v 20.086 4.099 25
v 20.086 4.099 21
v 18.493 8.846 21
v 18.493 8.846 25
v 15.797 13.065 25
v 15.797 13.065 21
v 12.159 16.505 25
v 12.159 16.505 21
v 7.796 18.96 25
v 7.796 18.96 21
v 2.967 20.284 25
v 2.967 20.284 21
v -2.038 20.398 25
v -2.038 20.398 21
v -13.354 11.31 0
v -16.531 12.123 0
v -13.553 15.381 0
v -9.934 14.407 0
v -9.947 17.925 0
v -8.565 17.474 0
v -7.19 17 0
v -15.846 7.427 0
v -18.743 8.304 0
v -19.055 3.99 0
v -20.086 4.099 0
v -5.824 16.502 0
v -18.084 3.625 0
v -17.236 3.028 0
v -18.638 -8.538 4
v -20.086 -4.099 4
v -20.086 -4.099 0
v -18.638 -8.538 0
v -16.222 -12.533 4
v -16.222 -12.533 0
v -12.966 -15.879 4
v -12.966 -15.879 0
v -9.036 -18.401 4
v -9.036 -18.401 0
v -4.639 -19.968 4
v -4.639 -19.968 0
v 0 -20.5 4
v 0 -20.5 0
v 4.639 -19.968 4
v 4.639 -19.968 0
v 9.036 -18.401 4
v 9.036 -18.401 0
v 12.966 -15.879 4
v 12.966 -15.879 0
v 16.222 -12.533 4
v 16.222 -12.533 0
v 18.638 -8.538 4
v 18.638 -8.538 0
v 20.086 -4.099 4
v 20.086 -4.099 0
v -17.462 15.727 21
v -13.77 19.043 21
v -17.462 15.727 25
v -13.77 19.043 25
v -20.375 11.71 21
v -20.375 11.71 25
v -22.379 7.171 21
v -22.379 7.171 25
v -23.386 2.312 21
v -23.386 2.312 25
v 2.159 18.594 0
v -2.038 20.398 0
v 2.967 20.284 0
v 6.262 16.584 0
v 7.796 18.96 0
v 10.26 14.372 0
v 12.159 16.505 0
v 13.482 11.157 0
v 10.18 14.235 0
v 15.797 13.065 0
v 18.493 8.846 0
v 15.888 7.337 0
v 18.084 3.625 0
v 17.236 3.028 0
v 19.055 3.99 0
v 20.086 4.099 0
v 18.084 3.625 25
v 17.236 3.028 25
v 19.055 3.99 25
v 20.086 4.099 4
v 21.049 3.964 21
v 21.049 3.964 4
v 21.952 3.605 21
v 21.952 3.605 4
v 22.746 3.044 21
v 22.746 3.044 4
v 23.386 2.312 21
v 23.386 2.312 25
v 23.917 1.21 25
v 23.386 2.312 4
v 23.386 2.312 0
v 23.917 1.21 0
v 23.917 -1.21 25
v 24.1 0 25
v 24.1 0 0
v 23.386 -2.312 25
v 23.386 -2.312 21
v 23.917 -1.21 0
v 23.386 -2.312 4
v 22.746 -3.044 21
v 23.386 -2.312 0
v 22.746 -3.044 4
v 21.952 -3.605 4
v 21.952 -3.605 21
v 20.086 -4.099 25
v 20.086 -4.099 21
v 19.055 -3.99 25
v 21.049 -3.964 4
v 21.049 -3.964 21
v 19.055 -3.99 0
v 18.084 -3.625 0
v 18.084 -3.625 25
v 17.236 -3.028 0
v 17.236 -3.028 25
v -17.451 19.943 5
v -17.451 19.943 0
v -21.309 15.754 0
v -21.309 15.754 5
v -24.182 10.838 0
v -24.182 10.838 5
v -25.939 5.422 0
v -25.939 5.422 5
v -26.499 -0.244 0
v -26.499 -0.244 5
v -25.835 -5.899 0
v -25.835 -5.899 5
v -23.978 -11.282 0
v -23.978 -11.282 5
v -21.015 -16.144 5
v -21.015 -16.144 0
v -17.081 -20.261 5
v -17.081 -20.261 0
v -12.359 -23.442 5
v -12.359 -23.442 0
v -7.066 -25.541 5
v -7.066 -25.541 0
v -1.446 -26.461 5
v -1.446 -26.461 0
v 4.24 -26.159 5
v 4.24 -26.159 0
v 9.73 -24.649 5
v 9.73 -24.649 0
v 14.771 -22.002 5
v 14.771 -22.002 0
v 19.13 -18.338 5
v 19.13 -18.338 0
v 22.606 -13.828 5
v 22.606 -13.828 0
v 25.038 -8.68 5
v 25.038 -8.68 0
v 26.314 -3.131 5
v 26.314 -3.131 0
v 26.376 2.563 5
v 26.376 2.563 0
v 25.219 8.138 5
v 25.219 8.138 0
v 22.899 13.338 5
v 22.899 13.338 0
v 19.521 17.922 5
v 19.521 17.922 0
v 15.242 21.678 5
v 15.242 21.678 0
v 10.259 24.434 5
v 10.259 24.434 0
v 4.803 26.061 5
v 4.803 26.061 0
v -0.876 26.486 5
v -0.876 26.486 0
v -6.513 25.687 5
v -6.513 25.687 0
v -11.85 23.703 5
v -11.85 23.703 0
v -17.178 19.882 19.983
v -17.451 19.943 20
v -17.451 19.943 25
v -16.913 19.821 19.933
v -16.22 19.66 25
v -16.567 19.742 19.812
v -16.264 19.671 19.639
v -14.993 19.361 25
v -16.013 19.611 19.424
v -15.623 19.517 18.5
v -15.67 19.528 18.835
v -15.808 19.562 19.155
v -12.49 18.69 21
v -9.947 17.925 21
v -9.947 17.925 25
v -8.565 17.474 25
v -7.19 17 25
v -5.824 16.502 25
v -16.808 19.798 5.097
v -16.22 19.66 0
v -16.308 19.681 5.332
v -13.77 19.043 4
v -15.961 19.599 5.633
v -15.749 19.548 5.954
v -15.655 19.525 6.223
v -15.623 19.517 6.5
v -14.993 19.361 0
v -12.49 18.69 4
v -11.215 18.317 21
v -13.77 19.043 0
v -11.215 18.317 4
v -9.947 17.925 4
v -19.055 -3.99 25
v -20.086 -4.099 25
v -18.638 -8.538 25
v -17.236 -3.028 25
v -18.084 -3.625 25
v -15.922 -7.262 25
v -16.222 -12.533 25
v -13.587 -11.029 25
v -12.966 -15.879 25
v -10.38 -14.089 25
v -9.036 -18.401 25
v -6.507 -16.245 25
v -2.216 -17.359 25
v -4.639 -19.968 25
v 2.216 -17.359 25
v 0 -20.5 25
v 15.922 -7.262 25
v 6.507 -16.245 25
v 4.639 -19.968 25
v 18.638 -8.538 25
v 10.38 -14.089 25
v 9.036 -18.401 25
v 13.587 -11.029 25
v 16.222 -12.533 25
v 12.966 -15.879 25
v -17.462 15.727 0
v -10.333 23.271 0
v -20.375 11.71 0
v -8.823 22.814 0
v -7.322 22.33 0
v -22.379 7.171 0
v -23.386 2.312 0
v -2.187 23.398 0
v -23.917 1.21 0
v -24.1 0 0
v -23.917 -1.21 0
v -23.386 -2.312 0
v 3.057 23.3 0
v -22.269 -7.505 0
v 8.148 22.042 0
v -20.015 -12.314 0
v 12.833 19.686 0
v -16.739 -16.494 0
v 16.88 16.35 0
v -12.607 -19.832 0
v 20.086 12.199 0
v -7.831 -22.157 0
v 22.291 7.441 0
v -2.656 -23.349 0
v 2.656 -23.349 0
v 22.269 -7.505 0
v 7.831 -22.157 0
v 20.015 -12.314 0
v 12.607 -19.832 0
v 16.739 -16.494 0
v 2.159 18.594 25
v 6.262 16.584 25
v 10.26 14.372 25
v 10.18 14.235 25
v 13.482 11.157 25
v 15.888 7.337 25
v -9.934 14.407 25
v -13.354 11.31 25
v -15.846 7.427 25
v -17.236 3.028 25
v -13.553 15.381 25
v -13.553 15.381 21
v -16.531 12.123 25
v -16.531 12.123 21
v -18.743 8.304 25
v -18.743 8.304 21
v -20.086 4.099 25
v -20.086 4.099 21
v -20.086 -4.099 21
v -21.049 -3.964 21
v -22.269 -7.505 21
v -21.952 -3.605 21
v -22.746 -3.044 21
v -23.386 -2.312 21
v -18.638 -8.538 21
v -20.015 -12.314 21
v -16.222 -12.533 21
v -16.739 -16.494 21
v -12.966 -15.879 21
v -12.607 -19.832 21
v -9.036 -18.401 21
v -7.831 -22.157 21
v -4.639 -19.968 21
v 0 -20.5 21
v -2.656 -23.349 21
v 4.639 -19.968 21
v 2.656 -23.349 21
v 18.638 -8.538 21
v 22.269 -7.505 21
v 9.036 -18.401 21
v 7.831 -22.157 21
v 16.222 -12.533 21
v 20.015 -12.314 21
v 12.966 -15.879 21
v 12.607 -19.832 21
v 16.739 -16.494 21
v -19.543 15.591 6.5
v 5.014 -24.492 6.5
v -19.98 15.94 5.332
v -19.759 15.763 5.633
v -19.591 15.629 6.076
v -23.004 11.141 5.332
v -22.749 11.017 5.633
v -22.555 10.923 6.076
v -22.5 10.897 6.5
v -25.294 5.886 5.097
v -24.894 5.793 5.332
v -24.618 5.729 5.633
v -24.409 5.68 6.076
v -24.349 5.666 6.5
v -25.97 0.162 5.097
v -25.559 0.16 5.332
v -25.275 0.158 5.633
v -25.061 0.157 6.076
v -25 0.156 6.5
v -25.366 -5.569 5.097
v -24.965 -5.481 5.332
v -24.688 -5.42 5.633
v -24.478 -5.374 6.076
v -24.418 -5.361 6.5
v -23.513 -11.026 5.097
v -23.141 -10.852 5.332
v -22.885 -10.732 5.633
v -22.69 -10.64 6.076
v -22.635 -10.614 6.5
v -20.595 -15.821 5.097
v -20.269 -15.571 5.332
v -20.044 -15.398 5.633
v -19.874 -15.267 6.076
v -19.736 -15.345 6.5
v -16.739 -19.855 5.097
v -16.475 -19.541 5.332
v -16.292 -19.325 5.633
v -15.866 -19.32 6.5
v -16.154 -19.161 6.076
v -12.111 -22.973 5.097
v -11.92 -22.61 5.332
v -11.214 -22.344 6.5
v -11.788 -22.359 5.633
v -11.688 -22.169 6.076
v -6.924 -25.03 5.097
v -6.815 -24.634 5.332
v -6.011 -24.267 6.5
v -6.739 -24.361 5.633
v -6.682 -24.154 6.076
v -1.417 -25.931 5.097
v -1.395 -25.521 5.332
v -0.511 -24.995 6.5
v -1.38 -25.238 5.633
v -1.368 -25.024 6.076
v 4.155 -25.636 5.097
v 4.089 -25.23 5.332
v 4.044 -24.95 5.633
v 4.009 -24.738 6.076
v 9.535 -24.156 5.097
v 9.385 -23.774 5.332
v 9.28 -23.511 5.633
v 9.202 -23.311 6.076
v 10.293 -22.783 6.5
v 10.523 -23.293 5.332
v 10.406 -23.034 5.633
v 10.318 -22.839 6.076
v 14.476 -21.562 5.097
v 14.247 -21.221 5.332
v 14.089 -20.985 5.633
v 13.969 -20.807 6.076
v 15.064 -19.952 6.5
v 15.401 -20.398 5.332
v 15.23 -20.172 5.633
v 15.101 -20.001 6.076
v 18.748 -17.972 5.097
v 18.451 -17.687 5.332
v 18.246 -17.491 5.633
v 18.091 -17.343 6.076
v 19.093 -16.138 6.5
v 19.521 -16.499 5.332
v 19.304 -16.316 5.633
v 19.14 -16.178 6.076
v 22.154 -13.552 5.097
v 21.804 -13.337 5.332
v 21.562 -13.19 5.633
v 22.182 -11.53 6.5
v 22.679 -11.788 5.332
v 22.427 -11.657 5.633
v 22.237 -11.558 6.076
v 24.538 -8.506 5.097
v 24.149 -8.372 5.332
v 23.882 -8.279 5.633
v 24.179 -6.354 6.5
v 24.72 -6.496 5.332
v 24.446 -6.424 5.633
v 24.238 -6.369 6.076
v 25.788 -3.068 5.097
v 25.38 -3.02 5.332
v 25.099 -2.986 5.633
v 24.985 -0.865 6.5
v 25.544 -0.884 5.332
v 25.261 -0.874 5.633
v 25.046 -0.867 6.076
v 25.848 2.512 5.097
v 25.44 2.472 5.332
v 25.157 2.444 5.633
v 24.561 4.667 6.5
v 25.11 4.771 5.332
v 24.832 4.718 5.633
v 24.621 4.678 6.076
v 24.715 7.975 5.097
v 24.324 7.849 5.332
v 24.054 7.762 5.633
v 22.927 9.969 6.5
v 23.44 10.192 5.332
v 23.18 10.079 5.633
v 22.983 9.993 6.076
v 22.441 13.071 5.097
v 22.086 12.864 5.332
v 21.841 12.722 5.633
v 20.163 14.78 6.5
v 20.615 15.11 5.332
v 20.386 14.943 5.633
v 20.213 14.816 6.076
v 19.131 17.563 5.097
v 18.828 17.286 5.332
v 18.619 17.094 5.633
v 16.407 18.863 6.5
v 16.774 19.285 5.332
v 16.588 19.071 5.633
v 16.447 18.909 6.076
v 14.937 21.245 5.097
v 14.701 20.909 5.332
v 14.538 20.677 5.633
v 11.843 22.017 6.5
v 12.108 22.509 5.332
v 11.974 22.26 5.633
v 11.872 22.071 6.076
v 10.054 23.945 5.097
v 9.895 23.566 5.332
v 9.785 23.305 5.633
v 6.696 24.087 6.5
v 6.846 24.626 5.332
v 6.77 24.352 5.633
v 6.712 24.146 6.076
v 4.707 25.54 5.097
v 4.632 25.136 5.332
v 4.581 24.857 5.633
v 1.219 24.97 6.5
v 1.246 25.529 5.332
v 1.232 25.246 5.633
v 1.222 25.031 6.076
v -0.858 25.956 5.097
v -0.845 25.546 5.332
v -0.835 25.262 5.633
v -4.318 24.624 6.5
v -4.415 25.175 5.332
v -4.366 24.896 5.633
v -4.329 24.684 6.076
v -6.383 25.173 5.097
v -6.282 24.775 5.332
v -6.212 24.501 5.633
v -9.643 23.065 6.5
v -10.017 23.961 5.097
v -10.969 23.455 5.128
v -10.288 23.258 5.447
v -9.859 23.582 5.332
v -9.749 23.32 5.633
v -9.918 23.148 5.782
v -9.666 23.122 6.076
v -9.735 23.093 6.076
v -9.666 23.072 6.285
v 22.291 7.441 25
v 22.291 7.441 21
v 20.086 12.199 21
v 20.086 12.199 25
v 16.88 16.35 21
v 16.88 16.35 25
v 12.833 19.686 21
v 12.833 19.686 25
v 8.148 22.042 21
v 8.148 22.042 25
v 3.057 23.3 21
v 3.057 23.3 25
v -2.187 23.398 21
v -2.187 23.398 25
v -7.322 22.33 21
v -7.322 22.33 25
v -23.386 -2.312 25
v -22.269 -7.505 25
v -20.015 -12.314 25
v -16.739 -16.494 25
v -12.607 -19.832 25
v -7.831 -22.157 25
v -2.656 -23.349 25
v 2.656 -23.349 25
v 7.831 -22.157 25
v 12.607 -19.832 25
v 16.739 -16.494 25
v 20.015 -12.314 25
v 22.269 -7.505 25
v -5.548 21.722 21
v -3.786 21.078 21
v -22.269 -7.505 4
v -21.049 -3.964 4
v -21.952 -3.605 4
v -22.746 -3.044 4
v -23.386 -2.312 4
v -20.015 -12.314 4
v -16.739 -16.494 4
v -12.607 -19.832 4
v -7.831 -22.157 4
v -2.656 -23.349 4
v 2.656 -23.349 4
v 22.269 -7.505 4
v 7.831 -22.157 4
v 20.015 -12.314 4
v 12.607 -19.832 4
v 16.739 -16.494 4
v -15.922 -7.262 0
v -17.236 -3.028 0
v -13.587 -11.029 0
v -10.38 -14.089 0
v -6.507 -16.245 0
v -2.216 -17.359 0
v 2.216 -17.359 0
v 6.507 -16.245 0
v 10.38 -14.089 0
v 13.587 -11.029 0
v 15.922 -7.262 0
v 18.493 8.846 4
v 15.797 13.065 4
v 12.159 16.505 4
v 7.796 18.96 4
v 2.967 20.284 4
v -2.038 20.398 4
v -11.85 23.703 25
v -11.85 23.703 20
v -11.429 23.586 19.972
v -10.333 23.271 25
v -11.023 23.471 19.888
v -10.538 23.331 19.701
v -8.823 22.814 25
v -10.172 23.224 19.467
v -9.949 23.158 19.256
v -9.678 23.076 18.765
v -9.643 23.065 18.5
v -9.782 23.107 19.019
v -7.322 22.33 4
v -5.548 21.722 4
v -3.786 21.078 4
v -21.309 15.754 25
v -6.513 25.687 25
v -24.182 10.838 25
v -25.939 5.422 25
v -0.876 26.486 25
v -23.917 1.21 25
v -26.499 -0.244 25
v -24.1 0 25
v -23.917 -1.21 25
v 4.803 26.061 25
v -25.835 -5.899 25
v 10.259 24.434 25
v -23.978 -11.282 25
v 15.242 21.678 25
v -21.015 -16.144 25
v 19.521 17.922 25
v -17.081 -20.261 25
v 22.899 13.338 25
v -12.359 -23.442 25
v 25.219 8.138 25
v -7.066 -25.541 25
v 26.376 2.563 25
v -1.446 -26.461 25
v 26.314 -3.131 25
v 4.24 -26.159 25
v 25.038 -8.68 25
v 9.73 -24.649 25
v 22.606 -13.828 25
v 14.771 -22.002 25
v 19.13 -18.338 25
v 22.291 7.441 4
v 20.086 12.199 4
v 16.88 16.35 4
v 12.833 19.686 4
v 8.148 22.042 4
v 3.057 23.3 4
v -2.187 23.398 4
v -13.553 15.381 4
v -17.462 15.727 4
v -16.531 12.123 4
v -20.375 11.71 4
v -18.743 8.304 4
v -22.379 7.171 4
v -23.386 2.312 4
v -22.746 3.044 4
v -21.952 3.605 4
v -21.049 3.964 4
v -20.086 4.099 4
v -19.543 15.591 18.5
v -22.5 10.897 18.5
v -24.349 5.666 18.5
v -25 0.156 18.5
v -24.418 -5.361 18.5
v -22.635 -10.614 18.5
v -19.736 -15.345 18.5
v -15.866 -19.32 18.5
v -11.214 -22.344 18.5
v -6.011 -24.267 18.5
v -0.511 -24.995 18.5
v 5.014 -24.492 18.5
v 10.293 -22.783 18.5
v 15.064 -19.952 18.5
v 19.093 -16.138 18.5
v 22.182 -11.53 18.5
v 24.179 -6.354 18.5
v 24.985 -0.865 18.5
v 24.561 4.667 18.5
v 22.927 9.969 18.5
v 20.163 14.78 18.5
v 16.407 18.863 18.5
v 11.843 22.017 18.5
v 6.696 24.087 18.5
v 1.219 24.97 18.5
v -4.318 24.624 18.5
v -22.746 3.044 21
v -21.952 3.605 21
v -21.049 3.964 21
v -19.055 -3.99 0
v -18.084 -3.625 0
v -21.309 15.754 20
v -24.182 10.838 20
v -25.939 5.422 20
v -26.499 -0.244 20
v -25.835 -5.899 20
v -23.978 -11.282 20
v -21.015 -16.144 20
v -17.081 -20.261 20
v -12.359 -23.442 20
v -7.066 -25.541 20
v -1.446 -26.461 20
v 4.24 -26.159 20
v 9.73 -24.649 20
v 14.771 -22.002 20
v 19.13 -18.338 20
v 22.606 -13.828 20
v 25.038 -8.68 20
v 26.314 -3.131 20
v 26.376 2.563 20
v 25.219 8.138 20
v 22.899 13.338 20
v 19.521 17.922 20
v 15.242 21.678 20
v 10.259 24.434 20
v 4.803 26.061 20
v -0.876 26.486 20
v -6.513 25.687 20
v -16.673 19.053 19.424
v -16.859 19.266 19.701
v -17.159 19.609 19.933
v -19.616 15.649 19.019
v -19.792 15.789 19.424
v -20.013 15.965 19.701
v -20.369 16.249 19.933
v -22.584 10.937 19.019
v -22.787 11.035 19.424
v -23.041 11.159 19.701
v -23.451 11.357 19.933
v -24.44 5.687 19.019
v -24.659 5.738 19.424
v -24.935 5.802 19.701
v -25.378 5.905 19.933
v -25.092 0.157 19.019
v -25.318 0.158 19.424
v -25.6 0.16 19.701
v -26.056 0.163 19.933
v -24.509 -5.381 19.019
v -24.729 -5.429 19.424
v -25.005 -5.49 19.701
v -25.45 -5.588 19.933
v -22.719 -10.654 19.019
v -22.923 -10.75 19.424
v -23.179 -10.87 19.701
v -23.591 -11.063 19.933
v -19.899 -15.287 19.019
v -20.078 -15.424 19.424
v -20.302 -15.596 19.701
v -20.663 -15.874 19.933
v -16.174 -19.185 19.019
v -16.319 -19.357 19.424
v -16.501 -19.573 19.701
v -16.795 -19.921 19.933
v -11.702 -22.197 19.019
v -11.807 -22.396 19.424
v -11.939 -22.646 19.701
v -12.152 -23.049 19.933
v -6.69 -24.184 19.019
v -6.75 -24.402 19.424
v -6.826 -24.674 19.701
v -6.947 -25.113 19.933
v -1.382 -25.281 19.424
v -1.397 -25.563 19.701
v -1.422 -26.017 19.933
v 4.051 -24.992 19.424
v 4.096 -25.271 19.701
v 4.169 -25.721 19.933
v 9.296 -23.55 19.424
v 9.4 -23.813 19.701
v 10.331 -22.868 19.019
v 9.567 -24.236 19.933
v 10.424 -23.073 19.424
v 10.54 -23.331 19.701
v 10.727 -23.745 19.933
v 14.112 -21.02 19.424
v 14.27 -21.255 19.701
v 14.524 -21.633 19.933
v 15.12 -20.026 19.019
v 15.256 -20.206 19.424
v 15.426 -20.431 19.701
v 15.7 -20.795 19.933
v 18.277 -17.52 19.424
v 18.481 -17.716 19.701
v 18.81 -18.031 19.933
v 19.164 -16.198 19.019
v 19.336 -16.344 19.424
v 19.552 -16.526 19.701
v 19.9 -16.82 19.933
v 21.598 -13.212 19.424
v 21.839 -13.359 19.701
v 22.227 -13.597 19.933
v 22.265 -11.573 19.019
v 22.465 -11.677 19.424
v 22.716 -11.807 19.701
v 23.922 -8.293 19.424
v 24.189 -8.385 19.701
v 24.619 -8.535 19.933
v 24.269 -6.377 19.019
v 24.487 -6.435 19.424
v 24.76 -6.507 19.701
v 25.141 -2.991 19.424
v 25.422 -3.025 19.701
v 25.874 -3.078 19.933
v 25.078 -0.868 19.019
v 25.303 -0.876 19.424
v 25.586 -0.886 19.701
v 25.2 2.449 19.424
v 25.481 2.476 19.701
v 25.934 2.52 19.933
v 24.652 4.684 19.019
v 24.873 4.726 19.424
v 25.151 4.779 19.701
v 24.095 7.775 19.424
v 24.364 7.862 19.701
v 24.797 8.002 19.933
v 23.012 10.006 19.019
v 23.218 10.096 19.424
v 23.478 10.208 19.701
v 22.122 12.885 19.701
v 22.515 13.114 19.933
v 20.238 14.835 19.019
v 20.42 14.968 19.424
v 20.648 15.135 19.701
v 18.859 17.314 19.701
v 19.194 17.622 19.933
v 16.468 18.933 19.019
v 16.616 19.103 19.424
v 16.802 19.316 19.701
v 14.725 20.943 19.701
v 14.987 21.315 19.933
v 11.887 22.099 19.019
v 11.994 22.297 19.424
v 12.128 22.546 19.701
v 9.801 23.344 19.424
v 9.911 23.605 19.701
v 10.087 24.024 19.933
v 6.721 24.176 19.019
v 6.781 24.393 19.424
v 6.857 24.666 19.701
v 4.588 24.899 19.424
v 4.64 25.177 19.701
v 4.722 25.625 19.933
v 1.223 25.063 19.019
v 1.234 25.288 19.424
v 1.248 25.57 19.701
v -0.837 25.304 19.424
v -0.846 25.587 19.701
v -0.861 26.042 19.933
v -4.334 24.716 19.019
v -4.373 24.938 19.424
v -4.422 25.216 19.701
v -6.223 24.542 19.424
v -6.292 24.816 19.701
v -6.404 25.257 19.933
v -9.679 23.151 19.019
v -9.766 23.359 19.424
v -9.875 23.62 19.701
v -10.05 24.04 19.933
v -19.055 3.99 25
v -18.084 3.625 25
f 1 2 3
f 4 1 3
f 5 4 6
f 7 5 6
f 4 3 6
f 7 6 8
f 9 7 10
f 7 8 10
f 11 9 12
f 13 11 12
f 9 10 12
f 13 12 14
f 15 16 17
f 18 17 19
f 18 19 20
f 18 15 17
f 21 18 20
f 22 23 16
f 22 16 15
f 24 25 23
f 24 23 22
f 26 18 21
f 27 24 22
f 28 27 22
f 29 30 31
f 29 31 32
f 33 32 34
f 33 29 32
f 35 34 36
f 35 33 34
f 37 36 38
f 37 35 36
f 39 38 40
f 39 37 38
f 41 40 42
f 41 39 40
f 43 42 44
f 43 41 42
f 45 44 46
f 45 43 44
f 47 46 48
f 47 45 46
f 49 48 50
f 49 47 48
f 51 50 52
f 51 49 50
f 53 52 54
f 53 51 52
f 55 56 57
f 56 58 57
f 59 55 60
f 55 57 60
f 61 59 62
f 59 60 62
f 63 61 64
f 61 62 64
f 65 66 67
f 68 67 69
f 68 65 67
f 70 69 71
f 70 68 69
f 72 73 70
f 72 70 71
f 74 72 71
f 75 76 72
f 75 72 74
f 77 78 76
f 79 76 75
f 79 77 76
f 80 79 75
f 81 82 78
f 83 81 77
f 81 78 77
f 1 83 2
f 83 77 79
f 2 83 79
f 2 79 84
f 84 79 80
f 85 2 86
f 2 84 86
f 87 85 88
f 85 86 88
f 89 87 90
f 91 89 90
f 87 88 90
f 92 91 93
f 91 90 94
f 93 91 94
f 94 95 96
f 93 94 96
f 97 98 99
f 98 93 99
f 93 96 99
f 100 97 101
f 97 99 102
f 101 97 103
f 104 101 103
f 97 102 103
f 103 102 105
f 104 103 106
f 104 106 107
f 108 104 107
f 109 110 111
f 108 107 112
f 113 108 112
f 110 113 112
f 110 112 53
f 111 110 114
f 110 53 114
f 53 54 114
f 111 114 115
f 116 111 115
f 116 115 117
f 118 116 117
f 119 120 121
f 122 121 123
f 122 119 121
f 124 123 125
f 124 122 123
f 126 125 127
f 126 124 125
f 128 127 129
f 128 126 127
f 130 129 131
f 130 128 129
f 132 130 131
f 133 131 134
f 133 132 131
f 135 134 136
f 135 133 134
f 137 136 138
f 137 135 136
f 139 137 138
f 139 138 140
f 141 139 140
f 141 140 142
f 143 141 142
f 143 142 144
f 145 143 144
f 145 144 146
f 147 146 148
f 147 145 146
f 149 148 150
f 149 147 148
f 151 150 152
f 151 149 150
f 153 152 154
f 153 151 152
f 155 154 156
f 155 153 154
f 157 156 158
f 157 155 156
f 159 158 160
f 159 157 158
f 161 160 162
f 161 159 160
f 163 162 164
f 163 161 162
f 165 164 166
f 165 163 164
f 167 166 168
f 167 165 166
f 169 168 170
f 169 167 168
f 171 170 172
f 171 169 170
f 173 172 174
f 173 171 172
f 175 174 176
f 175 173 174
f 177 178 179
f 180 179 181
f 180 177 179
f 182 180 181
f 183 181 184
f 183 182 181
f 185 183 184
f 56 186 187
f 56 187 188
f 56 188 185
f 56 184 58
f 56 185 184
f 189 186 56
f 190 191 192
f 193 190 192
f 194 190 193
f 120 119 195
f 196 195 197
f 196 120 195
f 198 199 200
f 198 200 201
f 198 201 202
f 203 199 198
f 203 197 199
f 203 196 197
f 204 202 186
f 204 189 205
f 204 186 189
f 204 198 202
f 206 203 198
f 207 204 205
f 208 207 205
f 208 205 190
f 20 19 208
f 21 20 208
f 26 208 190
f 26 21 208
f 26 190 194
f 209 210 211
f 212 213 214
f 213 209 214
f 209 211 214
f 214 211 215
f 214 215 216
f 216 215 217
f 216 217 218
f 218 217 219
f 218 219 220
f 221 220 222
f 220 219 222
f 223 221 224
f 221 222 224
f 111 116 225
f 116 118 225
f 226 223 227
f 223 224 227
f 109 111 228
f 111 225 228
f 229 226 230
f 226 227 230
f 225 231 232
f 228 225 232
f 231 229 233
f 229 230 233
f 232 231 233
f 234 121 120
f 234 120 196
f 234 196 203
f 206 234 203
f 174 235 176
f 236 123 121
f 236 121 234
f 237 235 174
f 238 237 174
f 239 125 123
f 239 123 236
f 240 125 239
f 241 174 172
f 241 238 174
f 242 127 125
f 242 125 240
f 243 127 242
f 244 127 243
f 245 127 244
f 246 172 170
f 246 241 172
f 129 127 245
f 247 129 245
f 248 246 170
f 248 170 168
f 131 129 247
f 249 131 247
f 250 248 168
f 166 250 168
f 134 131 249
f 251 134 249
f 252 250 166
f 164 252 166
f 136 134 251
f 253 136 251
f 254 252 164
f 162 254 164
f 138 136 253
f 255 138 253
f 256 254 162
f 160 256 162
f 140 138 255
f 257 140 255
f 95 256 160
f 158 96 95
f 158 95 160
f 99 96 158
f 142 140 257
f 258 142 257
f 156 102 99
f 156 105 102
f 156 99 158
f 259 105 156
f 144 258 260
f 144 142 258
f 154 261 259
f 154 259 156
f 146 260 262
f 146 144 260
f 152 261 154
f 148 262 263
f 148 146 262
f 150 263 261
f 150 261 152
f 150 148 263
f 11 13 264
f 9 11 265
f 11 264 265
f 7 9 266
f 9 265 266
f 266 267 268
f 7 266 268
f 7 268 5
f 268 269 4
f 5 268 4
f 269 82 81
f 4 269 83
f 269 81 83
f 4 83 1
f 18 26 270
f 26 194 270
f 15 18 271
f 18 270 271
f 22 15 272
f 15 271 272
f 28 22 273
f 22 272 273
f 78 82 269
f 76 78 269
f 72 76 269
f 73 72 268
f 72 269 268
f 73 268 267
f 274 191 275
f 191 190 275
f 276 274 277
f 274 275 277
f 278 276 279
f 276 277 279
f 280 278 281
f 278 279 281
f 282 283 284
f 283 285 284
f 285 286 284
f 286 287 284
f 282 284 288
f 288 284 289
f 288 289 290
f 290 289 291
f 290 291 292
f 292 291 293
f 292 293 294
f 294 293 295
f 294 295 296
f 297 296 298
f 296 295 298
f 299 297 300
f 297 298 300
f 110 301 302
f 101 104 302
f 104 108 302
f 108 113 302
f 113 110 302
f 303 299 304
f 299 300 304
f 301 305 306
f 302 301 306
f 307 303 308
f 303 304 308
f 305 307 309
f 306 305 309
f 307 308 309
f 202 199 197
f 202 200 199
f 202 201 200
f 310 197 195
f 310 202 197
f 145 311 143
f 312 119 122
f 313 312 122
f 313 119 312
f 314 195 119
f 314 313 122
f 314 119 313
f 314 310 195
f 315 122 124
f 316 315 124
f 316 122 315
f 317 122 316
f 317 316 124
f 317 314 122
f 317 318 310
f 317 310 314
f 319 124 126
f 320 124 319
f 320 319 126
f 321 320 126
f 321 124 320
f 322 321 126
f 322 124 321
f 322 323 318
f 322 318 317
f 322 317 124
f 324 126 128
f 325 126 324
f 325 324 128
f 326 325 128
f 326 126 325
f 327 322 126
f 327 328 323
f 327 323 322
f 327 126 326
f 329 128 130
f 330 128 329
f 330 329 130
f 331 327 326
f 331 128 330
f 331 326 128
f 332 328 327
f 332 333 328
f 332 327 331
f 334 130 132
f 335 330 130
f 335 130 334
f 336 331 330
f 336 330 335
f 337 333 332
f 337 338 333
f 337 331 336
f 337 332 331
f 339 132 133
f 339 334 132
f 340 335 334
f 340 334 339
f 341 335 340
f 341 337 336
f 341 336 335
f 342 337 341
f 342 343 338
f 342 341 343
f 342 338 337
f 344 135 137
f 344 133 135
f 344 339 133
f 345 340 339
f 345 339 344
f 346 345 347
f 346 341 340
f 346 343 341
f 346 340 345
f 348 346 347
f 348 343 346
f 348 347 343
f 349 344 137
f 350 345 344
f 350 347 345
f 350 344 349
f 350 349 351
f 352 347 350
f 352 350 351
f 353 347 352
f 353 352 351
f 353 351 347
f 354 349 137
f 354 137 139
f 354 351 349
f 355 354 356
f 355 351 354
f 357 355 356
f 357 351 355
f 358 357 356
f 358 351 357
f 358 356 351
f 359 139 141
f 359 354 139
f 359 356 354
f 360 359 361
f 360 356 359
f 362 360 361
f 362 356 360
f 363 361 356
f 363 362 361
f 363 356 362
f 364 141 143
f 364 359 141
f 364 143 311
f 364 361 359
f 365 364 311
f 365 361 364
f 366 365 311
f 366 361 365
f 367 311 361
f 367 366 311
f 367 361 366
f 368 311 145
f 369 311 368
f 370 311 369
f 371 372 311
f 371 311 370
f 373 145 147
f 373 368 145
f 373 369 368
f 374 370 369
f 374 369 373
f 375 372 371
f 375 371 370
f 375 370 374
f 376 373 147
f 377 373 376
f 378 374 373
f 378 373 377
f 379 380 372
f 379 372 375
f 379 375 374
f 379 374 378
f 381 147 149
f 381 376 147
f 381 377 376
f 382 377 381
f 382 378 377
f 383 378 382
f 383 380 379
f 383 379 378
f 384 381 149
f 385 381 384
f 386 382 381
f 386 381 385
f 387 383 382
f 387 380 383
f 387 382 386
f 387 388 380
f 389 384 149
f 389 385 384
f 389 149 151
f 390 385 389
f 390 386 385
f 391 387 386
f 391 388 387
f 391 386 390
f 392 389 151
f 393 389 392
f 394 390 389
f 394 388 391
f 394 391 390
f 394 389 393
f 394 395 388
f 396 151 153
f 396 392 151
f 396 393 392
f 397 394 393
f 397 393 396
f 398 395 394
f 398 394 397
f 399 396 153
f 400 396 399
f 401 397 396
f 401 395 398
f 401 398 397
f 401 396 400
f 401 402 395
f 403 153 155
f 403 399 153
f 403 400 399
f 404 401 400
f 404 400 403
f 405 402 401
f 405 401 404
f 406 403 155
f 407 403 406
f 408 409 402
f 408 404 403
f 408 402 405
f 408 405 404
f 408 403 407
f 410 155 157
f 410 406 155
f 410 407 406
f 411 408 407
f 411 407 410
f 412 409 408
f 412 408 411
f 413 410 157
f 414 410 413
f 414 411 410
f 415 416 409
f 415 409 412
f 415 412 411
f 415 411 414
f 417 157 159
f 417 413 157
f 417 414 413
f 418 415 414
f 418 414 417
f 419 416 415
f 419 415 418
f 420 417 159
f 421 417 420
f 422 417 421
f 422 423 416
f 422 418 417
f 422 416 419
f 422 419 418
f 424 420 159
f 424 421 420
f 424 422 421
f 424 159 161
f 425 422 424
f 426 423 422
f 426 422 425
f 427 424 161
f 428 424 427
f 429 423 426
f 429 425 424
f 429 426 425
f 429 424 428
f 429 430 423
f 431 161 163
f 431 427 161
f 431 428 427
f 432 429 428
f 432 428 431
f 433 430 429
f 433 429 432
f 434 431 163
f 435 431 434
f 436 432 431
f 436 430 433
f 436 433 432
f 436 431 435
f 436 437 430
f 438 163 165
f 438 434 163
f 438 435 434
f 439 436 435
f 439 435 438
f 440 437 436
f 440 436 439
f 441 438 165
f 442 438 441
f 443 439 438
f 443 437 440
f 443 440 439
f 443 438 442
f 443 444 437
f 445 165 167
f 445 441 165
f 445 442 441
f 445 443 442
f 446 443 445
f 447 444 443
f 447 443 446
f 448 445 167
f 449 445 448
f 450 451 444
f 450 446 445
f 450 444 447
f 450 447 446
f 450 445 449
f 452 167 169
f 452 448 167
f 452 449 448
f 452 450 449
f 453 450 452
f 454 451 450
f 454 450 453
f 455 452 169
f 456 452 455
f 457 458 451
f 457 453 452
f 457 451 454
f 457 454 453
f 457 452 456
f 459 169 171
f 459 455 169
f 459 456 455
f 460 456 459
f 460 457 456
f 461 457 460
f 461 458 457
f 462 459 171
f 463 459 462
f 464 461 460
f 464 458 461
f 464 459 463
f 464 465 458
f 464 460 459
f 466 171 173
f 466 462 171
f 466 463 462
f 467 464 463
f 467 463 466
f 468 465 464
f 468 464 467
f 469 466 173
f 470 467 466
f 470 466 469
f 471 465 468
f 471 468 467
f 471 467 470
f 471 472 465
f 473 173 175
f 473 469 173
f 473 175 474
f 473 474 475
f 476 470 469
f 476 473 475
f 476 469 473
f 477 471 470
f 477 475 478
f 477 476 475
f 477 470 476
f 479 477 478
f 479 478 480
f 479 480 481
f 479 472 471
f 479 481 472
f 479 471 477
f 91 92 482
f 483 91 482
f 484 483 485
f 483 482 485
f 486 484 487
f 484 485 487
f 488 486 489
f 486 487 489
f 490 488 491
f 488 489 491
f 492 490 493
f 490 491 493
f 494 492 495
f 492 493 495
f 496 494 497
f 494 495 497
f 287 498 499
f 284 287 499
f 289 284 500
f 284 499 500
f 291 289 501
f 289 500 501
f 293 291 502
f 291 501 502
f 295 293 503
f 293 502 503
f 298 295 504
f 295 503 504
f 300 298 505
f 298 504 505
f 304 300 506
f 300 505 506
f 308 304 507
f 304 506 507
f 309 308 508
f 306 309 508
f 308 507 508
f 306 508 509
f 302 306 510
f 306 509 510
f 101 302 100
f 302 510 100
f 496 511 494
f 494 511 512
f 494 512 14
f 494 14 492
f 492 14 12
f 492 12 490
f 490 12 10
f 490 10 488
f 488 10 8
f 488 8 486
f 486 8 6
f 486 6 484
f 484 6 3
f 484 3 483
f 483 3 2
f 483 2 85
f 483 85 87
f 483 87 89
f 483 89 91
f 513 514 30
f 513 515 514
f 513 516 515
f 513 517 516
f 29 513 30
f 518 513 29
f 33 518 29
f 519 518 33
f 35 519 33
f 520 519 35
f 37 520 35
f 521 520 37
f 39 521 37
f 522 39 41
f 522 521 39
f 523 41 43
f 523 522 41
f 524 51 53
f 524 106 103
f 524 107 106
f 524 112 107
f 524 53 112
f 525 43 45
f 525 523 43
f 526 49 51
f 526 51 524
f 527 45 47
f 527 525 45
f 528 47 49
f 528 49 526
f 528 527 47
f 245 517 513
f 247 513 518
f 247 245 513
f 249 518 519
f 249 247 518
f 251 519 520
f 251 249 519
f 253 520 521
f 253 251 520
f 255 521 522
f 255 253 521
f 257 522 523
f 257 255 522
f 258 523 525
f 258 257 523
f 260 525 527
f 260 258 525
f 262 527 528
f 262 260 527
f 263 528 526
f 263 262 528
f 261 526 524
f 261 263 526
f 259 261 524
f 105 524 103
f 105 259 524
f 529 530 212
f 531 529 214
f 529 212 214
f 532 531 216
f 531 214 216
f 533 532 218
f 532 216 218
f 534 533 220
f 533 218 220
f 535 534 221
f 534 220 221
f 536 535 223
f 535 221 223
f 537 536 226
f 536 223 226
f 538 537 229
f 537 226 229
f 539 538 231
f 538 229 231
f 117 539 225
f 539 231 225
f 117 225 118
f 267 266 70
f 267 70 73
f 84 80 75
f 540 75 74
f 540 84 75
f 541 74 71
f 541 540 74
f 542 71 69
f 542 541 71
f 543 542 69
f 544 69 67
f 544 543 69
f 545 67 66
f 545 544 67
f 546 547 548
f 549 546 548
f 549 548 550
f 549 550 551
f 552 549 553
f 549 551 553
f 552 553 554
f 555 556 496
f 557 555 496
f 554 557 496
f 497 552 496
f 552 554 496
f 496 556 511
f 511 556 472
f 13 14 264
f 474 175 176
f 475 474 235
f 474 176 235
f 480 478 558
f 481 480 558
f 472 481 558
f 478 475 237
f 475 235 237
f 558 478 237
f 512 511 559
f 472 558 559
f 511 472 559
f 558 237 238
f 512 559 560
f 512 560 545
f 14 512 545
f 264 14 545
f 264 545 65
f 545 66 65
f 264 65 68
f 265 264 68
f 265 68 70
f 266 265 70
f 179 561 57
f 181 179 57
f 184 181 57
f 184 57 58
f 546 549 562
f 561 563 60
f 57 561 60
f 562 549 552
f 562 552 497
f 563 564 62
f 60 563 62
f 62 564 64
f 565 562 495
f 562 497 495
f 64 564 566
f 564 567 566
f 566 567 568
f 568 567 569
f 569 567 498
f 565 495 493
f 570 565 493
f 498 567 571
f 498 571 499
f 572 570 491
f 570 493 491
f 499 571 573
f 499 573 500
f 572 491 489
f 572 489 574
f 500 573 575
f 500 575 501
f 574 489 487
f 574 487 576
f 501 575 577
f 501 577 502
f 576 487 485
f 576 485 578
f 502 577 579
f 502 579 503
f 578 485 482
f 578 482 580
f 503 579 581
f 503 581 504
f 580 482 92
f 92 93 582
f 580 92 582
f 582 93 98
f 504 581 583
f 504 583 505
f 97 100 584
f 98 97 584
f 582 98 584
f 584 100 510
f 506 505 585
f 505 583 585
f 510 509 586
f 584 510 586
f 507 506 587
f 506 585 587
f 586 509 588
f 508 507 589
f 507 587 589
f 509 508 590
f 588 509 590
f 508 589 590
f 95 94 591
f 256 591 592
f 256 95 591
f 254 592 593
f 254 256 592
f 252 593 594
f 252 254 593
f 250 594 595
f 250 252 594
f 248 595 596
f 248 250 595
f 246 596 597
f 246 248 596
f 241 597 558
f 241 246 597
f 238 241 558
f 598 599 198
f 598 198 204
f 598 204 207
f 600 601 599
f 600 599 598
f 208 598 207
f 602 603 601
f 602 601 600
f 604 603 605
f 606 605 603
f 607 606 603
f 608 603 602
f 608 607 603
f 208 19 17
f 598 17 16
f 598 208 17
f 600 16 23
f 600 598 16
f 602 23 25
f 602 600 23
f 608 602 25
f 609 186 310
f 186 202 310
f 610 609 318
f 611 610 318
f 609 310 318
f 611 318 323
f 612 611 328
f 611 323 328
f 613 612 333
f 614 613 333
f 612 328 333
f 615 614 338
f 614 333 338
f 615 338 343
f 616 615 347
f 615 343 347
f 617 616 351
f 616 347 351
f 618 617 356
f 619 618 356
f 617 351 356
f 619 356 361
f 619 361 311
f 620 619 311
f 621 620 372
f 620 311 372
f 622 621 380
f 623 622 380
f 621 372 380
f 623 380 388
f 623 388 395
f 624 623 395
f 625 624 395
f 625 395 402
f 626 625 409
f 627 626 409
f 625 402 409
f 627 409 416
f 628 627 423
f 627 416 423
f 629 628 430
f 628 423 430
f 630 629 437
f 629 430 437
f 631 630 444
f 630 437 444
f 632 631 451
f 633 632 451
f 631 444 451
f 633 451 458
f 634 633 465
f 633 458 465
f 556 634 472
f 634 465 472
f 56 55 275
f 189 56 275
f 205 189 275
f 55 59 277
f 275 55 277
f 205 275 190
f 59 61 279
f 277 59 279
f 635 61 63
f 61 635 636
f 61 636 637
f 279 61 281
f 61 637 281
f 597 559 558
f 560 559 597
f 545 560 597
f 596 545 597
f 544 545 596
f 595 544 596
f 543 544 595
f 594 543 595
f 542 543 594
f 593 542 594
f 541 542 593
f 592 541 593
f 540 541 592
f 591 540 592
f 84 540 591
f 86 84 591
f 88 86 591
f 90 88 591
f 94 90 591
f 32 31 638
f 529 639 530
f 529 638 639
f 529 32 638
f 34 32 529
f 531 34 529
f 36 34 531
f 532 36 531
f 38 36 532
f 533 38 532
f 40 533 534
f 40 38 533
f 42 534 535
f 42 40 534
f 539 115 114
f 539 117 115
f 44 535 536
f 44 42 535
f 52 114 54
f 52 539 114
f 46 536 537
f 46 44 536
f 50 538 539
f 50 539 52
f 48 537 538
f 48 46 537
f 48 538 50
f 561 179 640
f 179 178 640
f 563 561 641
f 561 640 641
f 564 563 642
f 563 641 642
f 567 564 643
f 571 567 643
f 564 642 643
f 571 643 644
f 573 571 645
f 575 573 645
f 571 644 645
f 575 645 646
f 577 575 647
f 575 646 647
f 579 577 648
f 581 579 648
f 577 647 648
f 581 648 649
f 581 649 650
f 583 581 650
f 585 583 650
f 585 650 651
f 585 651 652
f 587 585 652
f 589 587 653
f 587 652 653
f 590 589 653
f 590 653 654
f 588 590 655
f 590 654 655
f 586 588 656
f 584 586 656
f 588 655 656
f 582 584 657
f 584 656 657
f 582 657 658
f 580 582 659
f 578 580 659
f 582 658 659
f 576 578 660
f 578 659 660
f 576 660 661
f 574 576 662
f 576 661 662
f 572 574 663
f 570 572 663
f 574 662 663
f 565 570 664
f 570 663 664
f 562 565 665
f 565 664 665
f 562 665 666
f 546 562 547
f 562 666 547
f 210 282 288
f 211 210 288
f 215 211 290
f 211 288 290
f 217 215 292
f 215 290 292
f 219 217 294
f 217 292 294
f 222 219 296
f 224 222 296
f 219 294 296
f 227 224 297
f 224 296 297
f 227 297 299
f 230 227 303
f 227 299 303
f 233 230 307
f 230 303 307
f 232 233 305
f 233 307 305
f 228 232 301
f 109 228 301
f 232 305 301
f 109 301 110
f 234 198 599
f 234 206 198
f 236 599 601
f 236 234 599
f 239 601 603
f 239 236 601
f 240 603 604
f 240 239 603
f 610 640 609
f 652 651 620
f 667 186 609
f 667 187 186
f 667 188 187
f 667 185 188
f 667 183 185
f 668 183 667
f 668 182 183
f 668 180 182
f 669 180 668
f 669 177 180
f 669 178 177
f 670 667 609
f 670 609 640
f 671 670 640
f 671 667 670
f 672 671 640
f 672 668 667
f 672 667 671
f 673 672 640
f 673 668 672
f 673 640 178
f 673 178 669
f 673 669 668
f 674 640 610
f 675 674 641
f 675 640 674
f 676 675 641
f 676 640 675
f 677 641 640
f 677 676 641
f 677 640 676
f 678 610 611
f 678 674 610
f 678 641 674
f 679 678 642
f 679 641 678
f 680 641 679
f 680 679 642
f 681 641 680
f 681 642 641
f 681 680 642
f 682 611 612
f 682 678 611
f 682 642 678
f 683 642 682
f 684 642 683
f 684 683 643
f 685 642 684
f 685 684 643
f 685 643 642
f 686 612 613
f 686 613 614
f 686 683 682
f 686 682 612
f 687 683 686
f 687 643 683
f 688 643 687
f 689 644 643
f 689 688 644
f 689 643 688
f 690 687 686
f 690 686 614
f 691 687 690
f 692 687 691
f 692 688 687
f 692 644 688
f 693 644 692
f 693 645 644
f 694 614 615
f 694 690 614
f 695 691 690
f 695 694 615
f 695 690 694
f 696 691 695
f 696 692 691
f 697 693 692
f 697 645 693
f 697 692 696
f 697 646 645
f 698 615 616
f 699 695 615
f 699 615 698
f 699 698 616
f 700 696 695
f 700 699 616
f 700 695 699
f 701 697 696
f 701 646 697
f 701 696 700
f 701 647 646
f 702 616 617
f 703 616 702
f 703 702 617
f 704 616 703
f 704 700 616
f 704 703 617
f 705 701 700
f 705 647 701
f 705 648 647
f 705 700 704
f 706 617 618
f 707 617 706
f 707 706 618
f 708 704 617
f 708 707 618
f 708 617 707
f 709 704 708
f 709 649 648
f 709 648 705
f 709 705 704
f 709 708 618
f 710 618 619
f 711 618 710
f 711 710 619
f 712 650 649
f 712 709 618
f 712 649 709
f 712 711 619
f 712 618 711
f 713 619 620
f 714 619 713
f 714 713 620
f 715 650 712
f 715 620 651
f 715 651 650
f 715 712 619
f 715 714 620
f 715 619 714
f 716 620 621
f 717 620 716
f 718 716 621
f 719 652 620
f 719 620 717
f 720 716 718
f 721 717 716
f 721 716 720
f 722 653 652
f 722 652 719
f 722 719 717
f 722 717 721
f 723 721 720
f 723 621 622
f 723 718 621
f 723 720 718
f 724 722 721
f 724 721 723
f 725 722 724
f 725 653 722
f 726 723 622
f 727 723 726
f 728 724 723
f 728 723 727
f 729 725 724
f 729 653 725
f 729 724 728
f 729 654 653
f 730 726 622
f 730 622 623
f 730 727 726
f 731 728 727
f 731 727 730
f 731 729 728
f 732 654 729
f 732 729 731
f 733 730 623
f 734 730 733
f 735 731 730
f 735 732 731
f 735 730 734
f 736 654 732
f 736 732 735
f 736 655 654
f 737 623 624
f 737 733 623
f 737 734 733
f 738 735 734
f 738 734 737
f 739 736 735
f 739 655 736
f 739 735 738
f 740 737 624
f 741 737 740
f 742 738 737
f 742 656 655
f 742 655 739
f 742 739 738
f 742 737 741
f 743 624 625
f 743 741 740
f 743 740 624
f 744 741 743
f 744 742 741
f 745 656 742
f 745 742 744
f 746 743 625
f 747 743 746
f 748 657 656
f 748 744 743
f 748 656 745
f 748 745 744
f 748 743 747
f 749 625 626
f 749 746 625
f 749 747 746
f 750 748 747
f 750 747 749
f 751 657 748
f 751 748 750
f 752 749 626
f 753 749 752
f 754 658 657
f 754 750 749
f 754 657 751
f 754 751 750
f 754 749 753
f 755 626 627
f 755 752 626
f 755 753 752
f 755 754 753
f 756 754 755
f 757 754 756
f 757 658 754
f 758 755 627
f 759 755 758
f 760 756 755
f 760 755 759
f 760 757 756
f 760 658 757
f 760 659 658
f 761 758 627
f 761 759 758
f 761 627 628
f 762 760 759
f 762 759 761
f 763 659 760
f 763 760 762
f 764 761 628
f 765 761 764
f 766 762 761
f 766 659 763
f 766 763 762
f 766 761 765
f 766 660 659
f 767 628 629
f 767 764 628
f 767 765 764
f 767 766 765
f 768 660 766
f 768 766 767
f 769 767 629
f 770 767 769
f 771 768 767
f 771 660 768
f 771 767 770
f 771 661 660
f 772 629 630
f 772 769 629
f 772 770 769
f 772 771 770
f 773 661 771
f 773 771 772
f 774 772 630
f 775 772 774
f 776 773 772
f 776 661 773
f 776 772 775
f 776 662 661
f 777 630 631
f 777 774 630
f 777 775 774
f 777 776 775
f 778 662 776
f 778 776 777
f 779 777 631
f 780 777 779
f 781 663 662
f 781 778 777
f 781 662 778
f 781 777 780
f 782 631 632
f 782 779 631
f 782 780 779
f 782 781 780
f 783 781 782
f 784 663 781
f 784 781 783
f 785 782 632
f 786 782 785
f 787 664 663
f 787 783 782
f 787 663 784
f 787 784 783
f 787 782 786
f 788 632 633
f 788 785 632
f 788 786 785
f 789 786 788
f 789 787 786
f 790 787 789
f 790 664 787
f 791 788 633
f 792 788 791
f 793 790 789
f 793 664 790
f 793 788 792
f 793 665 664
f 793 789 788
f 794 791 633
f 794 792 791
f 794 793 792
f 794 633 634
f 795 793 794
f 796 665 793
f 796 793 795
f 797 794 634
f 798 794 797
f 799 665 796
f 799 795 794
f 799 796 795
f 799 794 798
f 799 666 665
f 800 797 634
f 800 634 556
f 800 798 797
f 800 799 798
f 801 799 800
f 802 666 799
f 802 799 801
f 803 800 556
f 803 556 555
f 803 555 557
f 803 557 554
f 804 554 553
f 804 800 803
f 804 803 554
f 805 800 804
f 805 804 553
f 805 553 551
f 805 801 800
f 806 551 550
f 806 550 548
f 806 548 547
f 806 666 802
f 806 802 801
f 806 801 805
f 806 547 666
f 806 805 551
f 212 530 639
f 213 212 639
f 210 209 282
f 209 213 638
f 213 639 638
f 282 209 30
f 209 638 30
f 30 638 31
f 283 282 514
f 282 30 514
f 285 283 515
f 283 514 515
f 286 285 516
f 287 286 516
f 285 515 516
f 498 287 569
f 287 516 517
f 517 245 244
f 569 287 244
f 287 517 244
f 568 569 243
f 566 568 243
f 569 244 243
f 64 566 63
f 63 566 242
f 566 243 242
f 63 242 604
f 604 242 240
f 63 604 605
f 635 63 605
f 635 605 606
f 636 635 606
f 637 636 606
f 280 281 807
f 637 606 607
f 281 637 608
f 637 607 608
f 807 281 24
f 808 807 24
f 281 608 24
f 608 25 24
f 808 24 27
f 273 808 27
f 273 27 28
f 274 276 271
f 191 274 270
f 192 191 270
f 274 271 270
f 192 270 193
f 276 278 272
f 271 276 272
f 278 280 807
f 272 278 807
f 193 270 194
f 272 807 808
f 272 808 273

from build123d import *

# Parameters (mm, degrees)
SKETCH001_R  = 4.1
POCKET_DEPTH = 25.001


with BuildPart() as part:
    # Sketch → Revolution (revolve)
    with BuildSketch(Plane.XZ):
        with BuildLine():
            Line((-17.5, 0), (-17.5, 25))
            Line((-17.5, 25), (-20.5, 25))
            Line((-20.5, 25), (-20.5, 21))
            Line((-20.5, 21), (-23.5, 21))
            Line((-23.5, 21), (-23.5, 25))
            Line((-23.5, 25), (-26.5, 25))
            Line((-26.5, 25), (-26.5, 20))
            ThreePointArc((-25, 18.5), (-25.43934, 19.56066), (-26.5, 20))
            Line((-25, 18.5), (-25, 6.5))
            ThreePointArc((-26.5, 5), (-25.43934, 5.43934), (-25, 6.5))
            Line((-26.5, 0), (-26.5, 5))
            Line((-23.5, 0), (-26.5, 0))
            Line((-23.5, 4), (-23.5, 0))
            Line((-20.5, 4), (-23.5, 4))
            Line((-20.5, 0), (-20.5, 4))
            Line((-17.5, 0), (-20.5, 0))
        make_face()
    revolve(axis=Axis((0, 0, 0), (0, 0, 1)))

    # Sketch001 (on Face1 of Revolution) → Pocket (cut, through all)
    with BuildSketch(Plane(origin=(0, 0, 0), x_dir=(1, 0, 0), z_dir=(0, 0, -1))):
        with Locations((20, 0)):
            Circle(SKETCH001_R)
        with Locations((-20, 0)):
            Circle(SKETCH001_R)
        with BuildLine():
            ThreePointArc((-20.070435, -20.480395), (-5.721449, -16.464083), (7.731739, -10.058157))
            Line((10.26, -14.371844), (7.731739, -10.058157))
            ThreePointArc((-19.14, -25.393062), (-3.96636, -21.145927), (10.26, -14.371844))
            Line((-20.070435, -20.480395), (-19.14, -25.393062))
        make_face()
    extrude(amount=-POCKET_DEPTH, mode=Mode.SUBTRACT)


solid = part.part
